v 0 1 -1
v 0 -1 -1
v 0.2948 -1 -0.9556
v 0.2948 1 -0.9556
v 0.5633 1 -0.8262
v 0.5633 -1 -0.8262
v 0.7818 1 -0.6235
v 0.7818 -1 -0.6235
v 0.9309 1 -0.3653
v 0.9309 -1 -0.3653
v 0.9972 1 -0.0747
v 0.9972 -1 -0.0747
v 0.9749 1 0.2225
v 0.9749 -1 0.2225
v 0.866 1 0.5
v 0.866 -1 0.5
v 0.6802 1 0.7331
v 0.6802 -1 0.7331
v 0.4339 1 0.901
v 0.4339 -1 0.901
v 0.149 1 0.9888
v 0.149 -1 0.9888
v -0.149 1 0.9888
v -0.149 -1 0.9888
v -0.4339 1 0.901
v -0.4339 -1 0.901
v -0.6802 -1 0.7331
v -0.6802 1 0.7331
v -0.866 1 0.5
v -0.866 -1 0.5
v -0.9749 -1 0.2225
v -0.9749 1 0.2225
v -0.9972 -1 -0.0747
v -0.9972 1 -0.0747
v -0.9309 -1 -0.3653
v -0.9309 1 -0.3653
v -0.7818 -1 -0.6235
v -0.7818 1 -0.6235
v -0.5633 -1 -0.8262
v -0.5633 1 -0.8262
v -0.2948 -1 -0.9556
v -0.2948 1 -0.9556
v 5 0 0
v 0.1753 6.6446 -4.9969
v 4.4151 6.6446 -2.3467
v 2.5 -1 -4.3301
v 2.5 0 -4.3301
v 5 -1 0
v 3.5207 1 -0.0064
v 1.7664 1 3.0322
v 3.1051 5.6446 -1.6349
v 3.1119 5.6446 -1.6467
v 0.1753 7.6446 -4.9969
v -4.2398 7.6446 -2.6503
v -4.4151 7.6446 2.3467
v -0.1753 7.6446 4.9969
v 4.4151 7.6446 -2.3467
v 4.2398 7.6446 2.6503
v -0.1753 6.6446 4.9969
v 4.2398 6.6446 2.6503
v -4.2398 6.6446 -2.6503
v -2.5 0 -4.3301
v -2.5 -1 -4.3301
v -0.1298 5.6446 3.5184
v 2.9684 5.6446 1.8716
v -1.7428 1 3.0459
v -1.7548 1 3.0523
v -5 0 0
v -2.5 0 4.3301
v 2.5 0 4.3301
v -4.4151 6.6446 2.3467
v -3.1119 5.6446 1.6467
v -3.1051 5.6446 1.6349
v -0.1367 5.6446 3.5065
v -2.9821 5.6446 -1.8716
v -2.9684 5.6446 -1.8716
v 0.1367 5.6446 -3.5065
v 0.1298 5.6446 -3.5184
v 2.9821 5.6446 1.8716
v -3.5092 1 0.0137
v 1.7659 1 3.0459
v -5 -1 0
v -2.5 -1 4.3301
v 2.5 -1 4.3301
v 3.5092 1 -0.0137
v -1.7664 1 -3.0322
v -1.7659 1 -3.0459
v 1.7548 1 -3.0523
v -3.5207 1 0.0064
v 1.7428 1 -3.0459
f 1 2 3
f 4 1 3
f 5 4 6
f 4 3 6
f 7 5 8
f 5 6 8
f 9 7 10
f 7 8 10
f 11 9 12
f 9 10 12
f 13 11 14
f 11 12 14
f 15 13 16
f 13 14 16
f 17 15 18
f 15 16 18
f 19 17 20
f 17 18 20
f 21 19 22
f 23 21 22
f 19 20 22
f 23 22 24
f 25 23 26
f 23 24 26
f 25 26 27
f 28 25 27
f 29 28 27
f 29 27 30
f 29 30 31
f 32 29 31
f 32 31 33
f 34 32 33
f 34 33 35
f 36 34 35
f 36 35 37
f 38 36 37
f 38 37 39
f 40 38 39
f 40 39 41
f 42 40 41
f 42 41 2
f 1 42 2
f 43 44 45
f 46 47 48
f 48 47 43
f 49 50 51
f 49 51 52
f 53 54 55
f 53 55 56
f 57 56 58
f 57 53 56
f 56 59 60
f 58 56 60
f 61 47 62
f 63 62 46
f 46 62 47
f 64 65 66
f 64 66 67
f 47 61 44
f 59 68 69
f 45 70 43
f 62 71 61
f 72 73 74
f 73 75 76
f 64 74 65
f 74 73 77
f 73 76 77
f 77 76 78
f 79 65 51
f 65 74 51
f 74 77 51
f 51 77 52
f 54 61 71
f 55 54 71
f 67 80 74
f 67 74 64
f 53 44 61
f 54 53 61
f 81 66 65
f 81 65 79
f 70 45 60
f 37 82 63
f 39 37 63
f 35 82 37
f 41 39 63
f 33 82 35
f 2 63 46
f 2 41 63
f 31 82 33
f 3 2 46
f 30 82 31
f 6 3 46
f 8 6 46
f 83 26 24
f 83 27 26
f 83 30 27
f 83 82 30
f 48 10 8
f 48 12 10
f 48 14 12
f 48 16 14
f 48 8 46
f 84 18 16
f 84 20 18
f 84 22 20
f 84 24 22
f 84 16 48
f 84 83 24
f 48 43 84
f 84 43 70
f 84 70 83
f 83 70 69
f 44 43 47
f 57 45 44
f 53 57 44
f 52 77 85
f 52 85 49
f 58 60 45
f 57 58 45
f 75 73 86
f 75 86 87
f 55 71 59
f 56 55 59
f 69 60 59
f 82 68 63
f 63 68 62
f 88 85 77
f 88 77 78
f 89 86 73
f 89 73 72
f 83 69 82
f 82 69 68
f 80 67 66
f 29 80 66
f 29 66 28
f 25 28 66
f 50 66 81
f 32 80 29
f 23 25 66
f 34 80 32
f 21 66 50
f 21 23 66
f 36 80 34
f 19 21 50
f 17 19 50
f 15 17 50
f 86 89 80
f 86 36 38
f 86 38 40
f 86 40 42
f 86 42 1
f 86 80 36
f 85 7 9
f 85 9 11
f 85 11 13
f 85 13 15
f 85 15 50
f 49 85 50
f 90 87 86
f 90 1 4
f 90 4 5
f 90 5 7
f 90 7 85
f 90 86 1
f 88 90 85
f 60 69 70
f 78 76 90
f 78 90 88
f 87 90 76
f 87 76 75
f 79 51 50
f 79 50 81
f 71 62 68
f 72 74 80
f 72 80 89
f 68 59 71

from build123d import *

# Parameters (mm, degrees)
CIRPATTERN2_9_6_ANGLE   = 300
CIRPATTERN2_8_9_ANGLE   = 240
CIRPATTERN2_10_11_ANGLE = 300
CIRPATTERN2_7_13_ANGLE  = 240
CIRPATTERN2_6_15_ANGLE  = 180
CIRPATTERN2_5_17_ANGLE  = 180
CIRPATTERN2_4_19_ANGLE  = 120
CIRPATTERN2_2_21_ANGLE  = 60
CIRPATTERN2_3_23_ANGLE  = 120
CIRPATTERN2_25_ANGLE    = 60
THICKEN1_T2             = 1
BOSS_EXTRUDE1_DEPTH     = 1
BOSS_EXTRUDE2_DEPTH     = 1
SKETCH14_R              = 1
CUT_EXTRUDE1_DEPTH      = 5


with BuildPart() as body_1:
    # Sketch7 → Surface-Plane5: a flat surface bounded by the sketch
    with BuildSketch(Plane(origin=(-3.524717678, 1.028951947, -2.0349967), x_dir=(0.46535585521279793, -0.13573914338570603, -0.8746535388209896), z_dir=(0.8396091564737522, -0.24510260263935496, 0.484748572504189)), mode=Mode.PRIVATE) as surface_plane5_2_region:
        Polygon((2.623971283, -0.700846857), (-2.326779276, -1.400896074), (-5.009045109, 5.141691335), align=None)
    surface_plane5_2 = surface_plane5_2_region.sketch.faces()[0]
    # Sketch2 → Surface-Plane6: a flat surface bounded by the sketch
    with BuildSketch(Plane(origin=(0, 6.644630244, 0), x_dir=(1, 0, 0), z_dir=(0, 1, 0)), mode=Mode.PRIVATE) as surface_plane6_3_region:
        Polygon((-4.239819176, 2.650270431), (-4.415111108, -2.346655898), (-0.175291932, -4.996926329), (4.239819176, -2.650270431), (4.415111108, 2.346655898), (0.175291932, 4.996926329), align=None)
    surface_plane6_3 = surface_plane6_3_region.sketch.faces()[0]
    # Sketch6 → Surface-Plane4: a flat surface bounded by the sketch
    with BuildSketch(Plane(origin=(-2.489523341, -0.629773886, -0.087332357), x_dir=(0.07067634350540625, -0.14247920195053043, -0.9872712552689084), z_dir=(0.968901161979092, 0.24510260263935799, 0.03398900550145962)), mode=Mode.PRIVATE) as surface_plane4_4_region:
        Polygon((4.098319079, 1.265627187), (1.370159284, 7.789210875), (-3.575551438, 7.054401069), align=None)
    surface_plane4_4 = surface_plane4_4_region.sketch.faces()[0]
    # Sketch6 → Surface-Plane4: a flat surface bounded by the sketch
    with BuildSketch(Plane(origin=(-2.489523341, -0.629773886, -0.087332357), x_dir=(0.07067634350540625, -0.14247920195053043, -0.9872712552689084), z_dir=(0.968901161979092, 0.24510260263935799, 0.03398900550145962)), mode=Mode.PRIVATE) as surface_plane4_5_region:
        Polygon((4.098319079, 1.265627187), (1.370159284, 7.789210875), (-3.575551438, 7.054401069), align=None)
    surface_plane4_5 = surface_plane4_5_region.sketch.faces()[0]
    # CirPattern2 9: a copy of that surface (a pattern of surface bodies)
    cirpattern2_9_6 = surface_plane4_5.rotate(Axis((0, 0, 0), (0, 1, 0)), CIRPATTERN2_9_6_ANGLE)
    # Sketch1 → Surface-Plane7: a flat surface bounded by the sketch
    with BuildSketch(Plane(origin=(0, 0, 0), x_dir=(1, 0, 0), z_dir=(0, 1, 0)), mode=Mode.PRIVATE) as surface_plane7_7_region:
        Polygon((5, 0), (2.5, 4.330127019), (-2.5, 4.330127019), (-5, 0), (-2.5, -4.330127019), (2.5, -4.330127019), align=None)
    surface_plane7_7 = surface_plane7_7_region.sketch.faces()[0]
    # Sketch7 → Surface-Plane5: a flat surface bounded by the sketch
    with BuildSketch(Plane(origin=(-3.524717678, 1.028951947, -2.0349967), x_dir=(0.46535585521279793, -0.13573914338570603, -0.8746535388209896), z_dir=(0.8396091564737522, -0.24510260263935496, 0.484748572504189)), mode=Mode.PRIVATE) as surface_plane5_8_region:
        Polygon((2.623971283, -0.700846857), (-2.326779276, -1.400896074), (-5.009045109, 5.141691335), align=None)
    surface_plane5_8 = surface_plane5_8_region.sketch.faces()[0]
    # CirPattern2 8: a copy of that surface (a pattern of surface bodies)
    cirpattern2_8_9 = surface_plane5_8.rotate(Axis((0, 0, 0), (0, 1, 0)), CIRPATTERN2_8_9_ANGLE)
    # Sketch7 → Surface-Plane5: a flat surface bounded by the sketch
    with BuildSketch(Plane(origin=(-3.524717678, 1.028951947, -2.0349967), x_dir=(0.46535585521279793, -0.13573914338570603, -0.8746535388209896), z_dir=(0.8396091564737522, -0.24510260263935496, 0.484748572504189)), mode=Mode.PRIVATE) as surface_plane5_10_region:
        Polygon((2.623971283, -0.700846857), (-2.326779276, -1.400896074), (-5.009045109, 5.141691335), align=None)
    surface_plane5_10 = surface_plane5_10_region.sketch.faces()[0]
    # CirPattern2 10: a copy of that surface (a pattern of surface bodies)
    cirpattern2_10_11 = surface_plane5_10.rotate(Axis((0, 0, 0), (0, 1, 0)), CIRPATTERN2_10_11_ANGLE)
    # Sketch6 → Surface-Plane4: a flat surface bounded by the sketch
    with BuildSketch(Plane(origin=(-2.489523341, -0.629773886, -0.087332357), x_dir=(0.07067634350540625, -0.14247920195053043, -0.9872712552689084), z_dir=(0.968901161979092, 0.24510260263935799, 0.03398900550145962)), mode=Mode.PRIVATE) as surface_plane4_12_region:
        Polygon((4.098319079, 1.265627187), (1.370159284, 7.789210875), (-3.575551438, 7.054401069), align=None)
    surface_plane4_12 = surface_plane4_12_region.sketch.faces()[0]
    # CirPattern2 7: a copy of that surface (a pattern of surface bodies)
    cirpattern2_7_13 = surface_plane4_12.rotate(Axis((0, 0, 0), (0, 1, 0)), CIRPATTERN2_7_13_ANGLE)
    # Sketch7 → Surface-Plane5: a flat surface bounded by the sketch
    with BuildSketch(Plane(origin=(-3.524717678, 1.028951947, -2.0349967), x_dir=(0.46535585521279793, -0.13573914338570603, -0.8746535388209896), z_dir=(0.8396091564737522, -0.24510260263935496, 0.484748572504189)), mode=Mode.PRIVATE) as surface_plane5_14_region:
        Polygon((2.623971283, -0.700846857), (-2.326779276, -1.400896074), (-5.009045109, 5.141691335), align=None)
    surface_plane5_14 = surface_plane5_14_region.sketch.faces()[0]
    # CirPattern2 6: a copy of that surface (a pattern of surface bodies)
    cirpattern2_6_15 = surface_plane5_14.rotate(Axis((0, 0, 0), (0, 1, 0)), CIRPATTERN2_6_15_ANGLE)
    # Sketch6 → Surface-Plane4: a flat surface bounded by the sketch
    with BuildSketch(Plane(origin=(-2.489523341, -0.629773886, -0.087332357), x_dir=(0.07067634350540625, -0.14247920195053043, -0.9872712552689084), z_dir=(0.968901161979092, 0.24510260263935799, 0.03398900550145962)), mode=Mode.PRIVATE) as surface_plane4_16_region:
        Polygon((4.098319079, 1.265627187), (1.370159284, 7.789210875), (-3.575551438, 7.054401069), align=None)
    surface_plane4_16 = surface_plane4_16_region.sketch.faces()[0]
    # CirPattern2 5: a copy of that surface (a pattern of surface bodies)
    cirpattern2_5_17 = surface_plane4_16.rotate(Axis((0, 0, 0), (0, 1, 0)), CIRPATTERN2_5_17_ANGLE)
    # Sketch7 → Surface-Plane5: a flat surface bounded by the sketch
    with BuildSketch(Plane(origin=(-3.524717678, 1.028951947, -2.0349967), x_dir=(0.46535585521279793, -0.13573914338570603, -0.8746535388209896), z_dir=(0.8396091564737522, -0.24510260263935496, 0.484748572504189)), mode=Mode.PRIVATE) as surface_plane5_18_region:
        Polygon((2.623971283, -0.700846857), (-2.326779276, -1.400896074), (-5.009045109, 5.141691335), align=None)
    surface_plane5_18 = surface_plane5_18_region.sketch.faces()[0]
    # CirPattern2 4: a copy of that surface (a pattern of surface bodies)
    cirpattern2_4_19 = surface_plane5_18.rotate(Axis((0, 0, 0), (0, 1, 0)), CIRPATTERN2_4_19_ANGLE)
    # Sketch7 → Surface-Plane5: a flat surface bounded by the sketch
    with BuildSketch(Plane(origin=(-3.524717678, 1.028951947, -2.0349967), x_dir=(0.46535585521279793, -0.13573914338570603, -0.8746535388209896), z_dir=(0.8396091564737522, -0.24510260263935496, 0.484748572504189)), mode=Mode.PRIVATE) as surface_plane5_20_region:
        Polygon((2.623971283, -0.700846857), (-2.326779276, -1.400896074), (-5.009045109, 5.141691335), align=None)
    surface_plane5_20 = surface_plane5_20_region.sketch.faces()[0]
    # CirPattern2 2: a copy of that surface (a pattern of surface bodies)
    cirpattern2_2_21 = surface_plane5_20.rotate(Axis((0, 0, 0), (0, 1, 0)), CIRPATTERN2_2_21_ANGLE)
    # Sketch6 → Surface-Plane4: a flat surface bounded by the sketch
    with BuildSketch(Plane(origin=(-2.489523341, -0.629773886, -0.087332357), x_dir=(0.07067634350540625, -0.14247920195053043, -0.9872712552689084), z_dir=(0.968901161979092, 0.24510260263935799, 0.03398900550145962)), mode=Mode.PRIVATE) as surface_plane4_22_region:
        Polygon((4.098319079, 1.265627187), (1.370159284, 7.789210875), (-3.575551438, 7.054401069), align=None)
    surface_plane4_22 = surface_plane4_22_region.sketch.faces()[0]
    # CirPattern2 3: a copy of that surface (a pattern of surface bodies)
    cirpattern2_3_23 = surface_plane4_22.rotate(Axis((0, 0, 0), (0, 1, 0)), CIRPATTERN2_3_23_ANGLE)
    # Sketch6 → Surface-Plane4: a flat surface bounded by the sketch
    with BuildSketch(Plane(origin=(-2.489523341, -0.629773886, -0.087332357), x_dir=(0.07067634350540625, -0.14247920195053043, -0.9872712552689084), z_dir=(0.968901161979092, 0.24510260263935799, 0.03398900550145962)), mode=Mode.PRIVATE) as surface_plane4_24_region:
        Polygon((4.098319079, 1.265627187), (1.370159284, 7.789210875), (-3.575551438, 7.054401069), align=None)
    surface_plane4_24 = surface_plane4_24_region.sketch.faces()[0]
    # CirPattern2: a copy of that surface (a pattern of surface bodies)
    cirpattern2_25 = surface_plane4_24.rotate(Axis((0, 0, 0), (0, 1, 0)), CIRPATTERN2_25_ANGLE)
    # Surface-Knit1: the surfaces knitted into one
    surface_knit1_1 = Shell(Face.sew_faces(surface_plane5_2.faces() + surface_plane6_3.faces() + surface_plane4_4.faces() + cirpattern2_9_6.faces() + surface_plane7_7.faces() + cirpattern2_8_9.faces() + cirpattern2_10_11.faces() + cirpattern2_7_13.faces() + cirpattern2_6_15.faces() + cirpattern2_5_17.faces() + cirpattern2_4_19.faces() + cirpattern2_2_21.faces() + cirpattern2_3_23.faces() + cirpattern2_25.faces())[0])
    add(Solid.thicken(surface_knit1_1, -THICKEN1_T2))

    # Sketch12 → Boss-Extrude1 (add)
    with BuildSketch(Plane(origin=(0, 6.644630244, 0), x_dir=(1, 0, 0), z_dir=(0, 1, 0))):
        Polygon((0.175291932, 4.996926329), (-4.239819176, 2.650270431), (-4.415111108, -2.346655898), (-0.175291932, -4.996926329), (4.239819176, -2.650270431), (4.415111108, 2.346655898), align=None)
    extrude(amount=BOSS_EXTRUDE1_DEPTH)

    # Sketch13 → Boss-Extrude2 (add)
    with BuildSketch(Plane.XZ):
        Polygon((5, 0), (2.5, 4.330127019), (-2.5, 4.330127019), (-5, 0), (-2.5, -4.330127019), (2.5, -4.330127019), align=None)
    extrude(amount=BOSS_EXTRUDE2_DEPTH)

    # Sketch14 → Cut-Extrude1 (cut)
    with BuildSketch(Plane.XZ.offset(1)):
        with Locations(Location((0, 0, 0), (0, 0, 270))):
            Circle(SKETCH14_R)
    extrude(amount=-CUT_EXTRUDE1_DEPTH, mode=Mode.SUBTRACT)


solid = body_1.part
